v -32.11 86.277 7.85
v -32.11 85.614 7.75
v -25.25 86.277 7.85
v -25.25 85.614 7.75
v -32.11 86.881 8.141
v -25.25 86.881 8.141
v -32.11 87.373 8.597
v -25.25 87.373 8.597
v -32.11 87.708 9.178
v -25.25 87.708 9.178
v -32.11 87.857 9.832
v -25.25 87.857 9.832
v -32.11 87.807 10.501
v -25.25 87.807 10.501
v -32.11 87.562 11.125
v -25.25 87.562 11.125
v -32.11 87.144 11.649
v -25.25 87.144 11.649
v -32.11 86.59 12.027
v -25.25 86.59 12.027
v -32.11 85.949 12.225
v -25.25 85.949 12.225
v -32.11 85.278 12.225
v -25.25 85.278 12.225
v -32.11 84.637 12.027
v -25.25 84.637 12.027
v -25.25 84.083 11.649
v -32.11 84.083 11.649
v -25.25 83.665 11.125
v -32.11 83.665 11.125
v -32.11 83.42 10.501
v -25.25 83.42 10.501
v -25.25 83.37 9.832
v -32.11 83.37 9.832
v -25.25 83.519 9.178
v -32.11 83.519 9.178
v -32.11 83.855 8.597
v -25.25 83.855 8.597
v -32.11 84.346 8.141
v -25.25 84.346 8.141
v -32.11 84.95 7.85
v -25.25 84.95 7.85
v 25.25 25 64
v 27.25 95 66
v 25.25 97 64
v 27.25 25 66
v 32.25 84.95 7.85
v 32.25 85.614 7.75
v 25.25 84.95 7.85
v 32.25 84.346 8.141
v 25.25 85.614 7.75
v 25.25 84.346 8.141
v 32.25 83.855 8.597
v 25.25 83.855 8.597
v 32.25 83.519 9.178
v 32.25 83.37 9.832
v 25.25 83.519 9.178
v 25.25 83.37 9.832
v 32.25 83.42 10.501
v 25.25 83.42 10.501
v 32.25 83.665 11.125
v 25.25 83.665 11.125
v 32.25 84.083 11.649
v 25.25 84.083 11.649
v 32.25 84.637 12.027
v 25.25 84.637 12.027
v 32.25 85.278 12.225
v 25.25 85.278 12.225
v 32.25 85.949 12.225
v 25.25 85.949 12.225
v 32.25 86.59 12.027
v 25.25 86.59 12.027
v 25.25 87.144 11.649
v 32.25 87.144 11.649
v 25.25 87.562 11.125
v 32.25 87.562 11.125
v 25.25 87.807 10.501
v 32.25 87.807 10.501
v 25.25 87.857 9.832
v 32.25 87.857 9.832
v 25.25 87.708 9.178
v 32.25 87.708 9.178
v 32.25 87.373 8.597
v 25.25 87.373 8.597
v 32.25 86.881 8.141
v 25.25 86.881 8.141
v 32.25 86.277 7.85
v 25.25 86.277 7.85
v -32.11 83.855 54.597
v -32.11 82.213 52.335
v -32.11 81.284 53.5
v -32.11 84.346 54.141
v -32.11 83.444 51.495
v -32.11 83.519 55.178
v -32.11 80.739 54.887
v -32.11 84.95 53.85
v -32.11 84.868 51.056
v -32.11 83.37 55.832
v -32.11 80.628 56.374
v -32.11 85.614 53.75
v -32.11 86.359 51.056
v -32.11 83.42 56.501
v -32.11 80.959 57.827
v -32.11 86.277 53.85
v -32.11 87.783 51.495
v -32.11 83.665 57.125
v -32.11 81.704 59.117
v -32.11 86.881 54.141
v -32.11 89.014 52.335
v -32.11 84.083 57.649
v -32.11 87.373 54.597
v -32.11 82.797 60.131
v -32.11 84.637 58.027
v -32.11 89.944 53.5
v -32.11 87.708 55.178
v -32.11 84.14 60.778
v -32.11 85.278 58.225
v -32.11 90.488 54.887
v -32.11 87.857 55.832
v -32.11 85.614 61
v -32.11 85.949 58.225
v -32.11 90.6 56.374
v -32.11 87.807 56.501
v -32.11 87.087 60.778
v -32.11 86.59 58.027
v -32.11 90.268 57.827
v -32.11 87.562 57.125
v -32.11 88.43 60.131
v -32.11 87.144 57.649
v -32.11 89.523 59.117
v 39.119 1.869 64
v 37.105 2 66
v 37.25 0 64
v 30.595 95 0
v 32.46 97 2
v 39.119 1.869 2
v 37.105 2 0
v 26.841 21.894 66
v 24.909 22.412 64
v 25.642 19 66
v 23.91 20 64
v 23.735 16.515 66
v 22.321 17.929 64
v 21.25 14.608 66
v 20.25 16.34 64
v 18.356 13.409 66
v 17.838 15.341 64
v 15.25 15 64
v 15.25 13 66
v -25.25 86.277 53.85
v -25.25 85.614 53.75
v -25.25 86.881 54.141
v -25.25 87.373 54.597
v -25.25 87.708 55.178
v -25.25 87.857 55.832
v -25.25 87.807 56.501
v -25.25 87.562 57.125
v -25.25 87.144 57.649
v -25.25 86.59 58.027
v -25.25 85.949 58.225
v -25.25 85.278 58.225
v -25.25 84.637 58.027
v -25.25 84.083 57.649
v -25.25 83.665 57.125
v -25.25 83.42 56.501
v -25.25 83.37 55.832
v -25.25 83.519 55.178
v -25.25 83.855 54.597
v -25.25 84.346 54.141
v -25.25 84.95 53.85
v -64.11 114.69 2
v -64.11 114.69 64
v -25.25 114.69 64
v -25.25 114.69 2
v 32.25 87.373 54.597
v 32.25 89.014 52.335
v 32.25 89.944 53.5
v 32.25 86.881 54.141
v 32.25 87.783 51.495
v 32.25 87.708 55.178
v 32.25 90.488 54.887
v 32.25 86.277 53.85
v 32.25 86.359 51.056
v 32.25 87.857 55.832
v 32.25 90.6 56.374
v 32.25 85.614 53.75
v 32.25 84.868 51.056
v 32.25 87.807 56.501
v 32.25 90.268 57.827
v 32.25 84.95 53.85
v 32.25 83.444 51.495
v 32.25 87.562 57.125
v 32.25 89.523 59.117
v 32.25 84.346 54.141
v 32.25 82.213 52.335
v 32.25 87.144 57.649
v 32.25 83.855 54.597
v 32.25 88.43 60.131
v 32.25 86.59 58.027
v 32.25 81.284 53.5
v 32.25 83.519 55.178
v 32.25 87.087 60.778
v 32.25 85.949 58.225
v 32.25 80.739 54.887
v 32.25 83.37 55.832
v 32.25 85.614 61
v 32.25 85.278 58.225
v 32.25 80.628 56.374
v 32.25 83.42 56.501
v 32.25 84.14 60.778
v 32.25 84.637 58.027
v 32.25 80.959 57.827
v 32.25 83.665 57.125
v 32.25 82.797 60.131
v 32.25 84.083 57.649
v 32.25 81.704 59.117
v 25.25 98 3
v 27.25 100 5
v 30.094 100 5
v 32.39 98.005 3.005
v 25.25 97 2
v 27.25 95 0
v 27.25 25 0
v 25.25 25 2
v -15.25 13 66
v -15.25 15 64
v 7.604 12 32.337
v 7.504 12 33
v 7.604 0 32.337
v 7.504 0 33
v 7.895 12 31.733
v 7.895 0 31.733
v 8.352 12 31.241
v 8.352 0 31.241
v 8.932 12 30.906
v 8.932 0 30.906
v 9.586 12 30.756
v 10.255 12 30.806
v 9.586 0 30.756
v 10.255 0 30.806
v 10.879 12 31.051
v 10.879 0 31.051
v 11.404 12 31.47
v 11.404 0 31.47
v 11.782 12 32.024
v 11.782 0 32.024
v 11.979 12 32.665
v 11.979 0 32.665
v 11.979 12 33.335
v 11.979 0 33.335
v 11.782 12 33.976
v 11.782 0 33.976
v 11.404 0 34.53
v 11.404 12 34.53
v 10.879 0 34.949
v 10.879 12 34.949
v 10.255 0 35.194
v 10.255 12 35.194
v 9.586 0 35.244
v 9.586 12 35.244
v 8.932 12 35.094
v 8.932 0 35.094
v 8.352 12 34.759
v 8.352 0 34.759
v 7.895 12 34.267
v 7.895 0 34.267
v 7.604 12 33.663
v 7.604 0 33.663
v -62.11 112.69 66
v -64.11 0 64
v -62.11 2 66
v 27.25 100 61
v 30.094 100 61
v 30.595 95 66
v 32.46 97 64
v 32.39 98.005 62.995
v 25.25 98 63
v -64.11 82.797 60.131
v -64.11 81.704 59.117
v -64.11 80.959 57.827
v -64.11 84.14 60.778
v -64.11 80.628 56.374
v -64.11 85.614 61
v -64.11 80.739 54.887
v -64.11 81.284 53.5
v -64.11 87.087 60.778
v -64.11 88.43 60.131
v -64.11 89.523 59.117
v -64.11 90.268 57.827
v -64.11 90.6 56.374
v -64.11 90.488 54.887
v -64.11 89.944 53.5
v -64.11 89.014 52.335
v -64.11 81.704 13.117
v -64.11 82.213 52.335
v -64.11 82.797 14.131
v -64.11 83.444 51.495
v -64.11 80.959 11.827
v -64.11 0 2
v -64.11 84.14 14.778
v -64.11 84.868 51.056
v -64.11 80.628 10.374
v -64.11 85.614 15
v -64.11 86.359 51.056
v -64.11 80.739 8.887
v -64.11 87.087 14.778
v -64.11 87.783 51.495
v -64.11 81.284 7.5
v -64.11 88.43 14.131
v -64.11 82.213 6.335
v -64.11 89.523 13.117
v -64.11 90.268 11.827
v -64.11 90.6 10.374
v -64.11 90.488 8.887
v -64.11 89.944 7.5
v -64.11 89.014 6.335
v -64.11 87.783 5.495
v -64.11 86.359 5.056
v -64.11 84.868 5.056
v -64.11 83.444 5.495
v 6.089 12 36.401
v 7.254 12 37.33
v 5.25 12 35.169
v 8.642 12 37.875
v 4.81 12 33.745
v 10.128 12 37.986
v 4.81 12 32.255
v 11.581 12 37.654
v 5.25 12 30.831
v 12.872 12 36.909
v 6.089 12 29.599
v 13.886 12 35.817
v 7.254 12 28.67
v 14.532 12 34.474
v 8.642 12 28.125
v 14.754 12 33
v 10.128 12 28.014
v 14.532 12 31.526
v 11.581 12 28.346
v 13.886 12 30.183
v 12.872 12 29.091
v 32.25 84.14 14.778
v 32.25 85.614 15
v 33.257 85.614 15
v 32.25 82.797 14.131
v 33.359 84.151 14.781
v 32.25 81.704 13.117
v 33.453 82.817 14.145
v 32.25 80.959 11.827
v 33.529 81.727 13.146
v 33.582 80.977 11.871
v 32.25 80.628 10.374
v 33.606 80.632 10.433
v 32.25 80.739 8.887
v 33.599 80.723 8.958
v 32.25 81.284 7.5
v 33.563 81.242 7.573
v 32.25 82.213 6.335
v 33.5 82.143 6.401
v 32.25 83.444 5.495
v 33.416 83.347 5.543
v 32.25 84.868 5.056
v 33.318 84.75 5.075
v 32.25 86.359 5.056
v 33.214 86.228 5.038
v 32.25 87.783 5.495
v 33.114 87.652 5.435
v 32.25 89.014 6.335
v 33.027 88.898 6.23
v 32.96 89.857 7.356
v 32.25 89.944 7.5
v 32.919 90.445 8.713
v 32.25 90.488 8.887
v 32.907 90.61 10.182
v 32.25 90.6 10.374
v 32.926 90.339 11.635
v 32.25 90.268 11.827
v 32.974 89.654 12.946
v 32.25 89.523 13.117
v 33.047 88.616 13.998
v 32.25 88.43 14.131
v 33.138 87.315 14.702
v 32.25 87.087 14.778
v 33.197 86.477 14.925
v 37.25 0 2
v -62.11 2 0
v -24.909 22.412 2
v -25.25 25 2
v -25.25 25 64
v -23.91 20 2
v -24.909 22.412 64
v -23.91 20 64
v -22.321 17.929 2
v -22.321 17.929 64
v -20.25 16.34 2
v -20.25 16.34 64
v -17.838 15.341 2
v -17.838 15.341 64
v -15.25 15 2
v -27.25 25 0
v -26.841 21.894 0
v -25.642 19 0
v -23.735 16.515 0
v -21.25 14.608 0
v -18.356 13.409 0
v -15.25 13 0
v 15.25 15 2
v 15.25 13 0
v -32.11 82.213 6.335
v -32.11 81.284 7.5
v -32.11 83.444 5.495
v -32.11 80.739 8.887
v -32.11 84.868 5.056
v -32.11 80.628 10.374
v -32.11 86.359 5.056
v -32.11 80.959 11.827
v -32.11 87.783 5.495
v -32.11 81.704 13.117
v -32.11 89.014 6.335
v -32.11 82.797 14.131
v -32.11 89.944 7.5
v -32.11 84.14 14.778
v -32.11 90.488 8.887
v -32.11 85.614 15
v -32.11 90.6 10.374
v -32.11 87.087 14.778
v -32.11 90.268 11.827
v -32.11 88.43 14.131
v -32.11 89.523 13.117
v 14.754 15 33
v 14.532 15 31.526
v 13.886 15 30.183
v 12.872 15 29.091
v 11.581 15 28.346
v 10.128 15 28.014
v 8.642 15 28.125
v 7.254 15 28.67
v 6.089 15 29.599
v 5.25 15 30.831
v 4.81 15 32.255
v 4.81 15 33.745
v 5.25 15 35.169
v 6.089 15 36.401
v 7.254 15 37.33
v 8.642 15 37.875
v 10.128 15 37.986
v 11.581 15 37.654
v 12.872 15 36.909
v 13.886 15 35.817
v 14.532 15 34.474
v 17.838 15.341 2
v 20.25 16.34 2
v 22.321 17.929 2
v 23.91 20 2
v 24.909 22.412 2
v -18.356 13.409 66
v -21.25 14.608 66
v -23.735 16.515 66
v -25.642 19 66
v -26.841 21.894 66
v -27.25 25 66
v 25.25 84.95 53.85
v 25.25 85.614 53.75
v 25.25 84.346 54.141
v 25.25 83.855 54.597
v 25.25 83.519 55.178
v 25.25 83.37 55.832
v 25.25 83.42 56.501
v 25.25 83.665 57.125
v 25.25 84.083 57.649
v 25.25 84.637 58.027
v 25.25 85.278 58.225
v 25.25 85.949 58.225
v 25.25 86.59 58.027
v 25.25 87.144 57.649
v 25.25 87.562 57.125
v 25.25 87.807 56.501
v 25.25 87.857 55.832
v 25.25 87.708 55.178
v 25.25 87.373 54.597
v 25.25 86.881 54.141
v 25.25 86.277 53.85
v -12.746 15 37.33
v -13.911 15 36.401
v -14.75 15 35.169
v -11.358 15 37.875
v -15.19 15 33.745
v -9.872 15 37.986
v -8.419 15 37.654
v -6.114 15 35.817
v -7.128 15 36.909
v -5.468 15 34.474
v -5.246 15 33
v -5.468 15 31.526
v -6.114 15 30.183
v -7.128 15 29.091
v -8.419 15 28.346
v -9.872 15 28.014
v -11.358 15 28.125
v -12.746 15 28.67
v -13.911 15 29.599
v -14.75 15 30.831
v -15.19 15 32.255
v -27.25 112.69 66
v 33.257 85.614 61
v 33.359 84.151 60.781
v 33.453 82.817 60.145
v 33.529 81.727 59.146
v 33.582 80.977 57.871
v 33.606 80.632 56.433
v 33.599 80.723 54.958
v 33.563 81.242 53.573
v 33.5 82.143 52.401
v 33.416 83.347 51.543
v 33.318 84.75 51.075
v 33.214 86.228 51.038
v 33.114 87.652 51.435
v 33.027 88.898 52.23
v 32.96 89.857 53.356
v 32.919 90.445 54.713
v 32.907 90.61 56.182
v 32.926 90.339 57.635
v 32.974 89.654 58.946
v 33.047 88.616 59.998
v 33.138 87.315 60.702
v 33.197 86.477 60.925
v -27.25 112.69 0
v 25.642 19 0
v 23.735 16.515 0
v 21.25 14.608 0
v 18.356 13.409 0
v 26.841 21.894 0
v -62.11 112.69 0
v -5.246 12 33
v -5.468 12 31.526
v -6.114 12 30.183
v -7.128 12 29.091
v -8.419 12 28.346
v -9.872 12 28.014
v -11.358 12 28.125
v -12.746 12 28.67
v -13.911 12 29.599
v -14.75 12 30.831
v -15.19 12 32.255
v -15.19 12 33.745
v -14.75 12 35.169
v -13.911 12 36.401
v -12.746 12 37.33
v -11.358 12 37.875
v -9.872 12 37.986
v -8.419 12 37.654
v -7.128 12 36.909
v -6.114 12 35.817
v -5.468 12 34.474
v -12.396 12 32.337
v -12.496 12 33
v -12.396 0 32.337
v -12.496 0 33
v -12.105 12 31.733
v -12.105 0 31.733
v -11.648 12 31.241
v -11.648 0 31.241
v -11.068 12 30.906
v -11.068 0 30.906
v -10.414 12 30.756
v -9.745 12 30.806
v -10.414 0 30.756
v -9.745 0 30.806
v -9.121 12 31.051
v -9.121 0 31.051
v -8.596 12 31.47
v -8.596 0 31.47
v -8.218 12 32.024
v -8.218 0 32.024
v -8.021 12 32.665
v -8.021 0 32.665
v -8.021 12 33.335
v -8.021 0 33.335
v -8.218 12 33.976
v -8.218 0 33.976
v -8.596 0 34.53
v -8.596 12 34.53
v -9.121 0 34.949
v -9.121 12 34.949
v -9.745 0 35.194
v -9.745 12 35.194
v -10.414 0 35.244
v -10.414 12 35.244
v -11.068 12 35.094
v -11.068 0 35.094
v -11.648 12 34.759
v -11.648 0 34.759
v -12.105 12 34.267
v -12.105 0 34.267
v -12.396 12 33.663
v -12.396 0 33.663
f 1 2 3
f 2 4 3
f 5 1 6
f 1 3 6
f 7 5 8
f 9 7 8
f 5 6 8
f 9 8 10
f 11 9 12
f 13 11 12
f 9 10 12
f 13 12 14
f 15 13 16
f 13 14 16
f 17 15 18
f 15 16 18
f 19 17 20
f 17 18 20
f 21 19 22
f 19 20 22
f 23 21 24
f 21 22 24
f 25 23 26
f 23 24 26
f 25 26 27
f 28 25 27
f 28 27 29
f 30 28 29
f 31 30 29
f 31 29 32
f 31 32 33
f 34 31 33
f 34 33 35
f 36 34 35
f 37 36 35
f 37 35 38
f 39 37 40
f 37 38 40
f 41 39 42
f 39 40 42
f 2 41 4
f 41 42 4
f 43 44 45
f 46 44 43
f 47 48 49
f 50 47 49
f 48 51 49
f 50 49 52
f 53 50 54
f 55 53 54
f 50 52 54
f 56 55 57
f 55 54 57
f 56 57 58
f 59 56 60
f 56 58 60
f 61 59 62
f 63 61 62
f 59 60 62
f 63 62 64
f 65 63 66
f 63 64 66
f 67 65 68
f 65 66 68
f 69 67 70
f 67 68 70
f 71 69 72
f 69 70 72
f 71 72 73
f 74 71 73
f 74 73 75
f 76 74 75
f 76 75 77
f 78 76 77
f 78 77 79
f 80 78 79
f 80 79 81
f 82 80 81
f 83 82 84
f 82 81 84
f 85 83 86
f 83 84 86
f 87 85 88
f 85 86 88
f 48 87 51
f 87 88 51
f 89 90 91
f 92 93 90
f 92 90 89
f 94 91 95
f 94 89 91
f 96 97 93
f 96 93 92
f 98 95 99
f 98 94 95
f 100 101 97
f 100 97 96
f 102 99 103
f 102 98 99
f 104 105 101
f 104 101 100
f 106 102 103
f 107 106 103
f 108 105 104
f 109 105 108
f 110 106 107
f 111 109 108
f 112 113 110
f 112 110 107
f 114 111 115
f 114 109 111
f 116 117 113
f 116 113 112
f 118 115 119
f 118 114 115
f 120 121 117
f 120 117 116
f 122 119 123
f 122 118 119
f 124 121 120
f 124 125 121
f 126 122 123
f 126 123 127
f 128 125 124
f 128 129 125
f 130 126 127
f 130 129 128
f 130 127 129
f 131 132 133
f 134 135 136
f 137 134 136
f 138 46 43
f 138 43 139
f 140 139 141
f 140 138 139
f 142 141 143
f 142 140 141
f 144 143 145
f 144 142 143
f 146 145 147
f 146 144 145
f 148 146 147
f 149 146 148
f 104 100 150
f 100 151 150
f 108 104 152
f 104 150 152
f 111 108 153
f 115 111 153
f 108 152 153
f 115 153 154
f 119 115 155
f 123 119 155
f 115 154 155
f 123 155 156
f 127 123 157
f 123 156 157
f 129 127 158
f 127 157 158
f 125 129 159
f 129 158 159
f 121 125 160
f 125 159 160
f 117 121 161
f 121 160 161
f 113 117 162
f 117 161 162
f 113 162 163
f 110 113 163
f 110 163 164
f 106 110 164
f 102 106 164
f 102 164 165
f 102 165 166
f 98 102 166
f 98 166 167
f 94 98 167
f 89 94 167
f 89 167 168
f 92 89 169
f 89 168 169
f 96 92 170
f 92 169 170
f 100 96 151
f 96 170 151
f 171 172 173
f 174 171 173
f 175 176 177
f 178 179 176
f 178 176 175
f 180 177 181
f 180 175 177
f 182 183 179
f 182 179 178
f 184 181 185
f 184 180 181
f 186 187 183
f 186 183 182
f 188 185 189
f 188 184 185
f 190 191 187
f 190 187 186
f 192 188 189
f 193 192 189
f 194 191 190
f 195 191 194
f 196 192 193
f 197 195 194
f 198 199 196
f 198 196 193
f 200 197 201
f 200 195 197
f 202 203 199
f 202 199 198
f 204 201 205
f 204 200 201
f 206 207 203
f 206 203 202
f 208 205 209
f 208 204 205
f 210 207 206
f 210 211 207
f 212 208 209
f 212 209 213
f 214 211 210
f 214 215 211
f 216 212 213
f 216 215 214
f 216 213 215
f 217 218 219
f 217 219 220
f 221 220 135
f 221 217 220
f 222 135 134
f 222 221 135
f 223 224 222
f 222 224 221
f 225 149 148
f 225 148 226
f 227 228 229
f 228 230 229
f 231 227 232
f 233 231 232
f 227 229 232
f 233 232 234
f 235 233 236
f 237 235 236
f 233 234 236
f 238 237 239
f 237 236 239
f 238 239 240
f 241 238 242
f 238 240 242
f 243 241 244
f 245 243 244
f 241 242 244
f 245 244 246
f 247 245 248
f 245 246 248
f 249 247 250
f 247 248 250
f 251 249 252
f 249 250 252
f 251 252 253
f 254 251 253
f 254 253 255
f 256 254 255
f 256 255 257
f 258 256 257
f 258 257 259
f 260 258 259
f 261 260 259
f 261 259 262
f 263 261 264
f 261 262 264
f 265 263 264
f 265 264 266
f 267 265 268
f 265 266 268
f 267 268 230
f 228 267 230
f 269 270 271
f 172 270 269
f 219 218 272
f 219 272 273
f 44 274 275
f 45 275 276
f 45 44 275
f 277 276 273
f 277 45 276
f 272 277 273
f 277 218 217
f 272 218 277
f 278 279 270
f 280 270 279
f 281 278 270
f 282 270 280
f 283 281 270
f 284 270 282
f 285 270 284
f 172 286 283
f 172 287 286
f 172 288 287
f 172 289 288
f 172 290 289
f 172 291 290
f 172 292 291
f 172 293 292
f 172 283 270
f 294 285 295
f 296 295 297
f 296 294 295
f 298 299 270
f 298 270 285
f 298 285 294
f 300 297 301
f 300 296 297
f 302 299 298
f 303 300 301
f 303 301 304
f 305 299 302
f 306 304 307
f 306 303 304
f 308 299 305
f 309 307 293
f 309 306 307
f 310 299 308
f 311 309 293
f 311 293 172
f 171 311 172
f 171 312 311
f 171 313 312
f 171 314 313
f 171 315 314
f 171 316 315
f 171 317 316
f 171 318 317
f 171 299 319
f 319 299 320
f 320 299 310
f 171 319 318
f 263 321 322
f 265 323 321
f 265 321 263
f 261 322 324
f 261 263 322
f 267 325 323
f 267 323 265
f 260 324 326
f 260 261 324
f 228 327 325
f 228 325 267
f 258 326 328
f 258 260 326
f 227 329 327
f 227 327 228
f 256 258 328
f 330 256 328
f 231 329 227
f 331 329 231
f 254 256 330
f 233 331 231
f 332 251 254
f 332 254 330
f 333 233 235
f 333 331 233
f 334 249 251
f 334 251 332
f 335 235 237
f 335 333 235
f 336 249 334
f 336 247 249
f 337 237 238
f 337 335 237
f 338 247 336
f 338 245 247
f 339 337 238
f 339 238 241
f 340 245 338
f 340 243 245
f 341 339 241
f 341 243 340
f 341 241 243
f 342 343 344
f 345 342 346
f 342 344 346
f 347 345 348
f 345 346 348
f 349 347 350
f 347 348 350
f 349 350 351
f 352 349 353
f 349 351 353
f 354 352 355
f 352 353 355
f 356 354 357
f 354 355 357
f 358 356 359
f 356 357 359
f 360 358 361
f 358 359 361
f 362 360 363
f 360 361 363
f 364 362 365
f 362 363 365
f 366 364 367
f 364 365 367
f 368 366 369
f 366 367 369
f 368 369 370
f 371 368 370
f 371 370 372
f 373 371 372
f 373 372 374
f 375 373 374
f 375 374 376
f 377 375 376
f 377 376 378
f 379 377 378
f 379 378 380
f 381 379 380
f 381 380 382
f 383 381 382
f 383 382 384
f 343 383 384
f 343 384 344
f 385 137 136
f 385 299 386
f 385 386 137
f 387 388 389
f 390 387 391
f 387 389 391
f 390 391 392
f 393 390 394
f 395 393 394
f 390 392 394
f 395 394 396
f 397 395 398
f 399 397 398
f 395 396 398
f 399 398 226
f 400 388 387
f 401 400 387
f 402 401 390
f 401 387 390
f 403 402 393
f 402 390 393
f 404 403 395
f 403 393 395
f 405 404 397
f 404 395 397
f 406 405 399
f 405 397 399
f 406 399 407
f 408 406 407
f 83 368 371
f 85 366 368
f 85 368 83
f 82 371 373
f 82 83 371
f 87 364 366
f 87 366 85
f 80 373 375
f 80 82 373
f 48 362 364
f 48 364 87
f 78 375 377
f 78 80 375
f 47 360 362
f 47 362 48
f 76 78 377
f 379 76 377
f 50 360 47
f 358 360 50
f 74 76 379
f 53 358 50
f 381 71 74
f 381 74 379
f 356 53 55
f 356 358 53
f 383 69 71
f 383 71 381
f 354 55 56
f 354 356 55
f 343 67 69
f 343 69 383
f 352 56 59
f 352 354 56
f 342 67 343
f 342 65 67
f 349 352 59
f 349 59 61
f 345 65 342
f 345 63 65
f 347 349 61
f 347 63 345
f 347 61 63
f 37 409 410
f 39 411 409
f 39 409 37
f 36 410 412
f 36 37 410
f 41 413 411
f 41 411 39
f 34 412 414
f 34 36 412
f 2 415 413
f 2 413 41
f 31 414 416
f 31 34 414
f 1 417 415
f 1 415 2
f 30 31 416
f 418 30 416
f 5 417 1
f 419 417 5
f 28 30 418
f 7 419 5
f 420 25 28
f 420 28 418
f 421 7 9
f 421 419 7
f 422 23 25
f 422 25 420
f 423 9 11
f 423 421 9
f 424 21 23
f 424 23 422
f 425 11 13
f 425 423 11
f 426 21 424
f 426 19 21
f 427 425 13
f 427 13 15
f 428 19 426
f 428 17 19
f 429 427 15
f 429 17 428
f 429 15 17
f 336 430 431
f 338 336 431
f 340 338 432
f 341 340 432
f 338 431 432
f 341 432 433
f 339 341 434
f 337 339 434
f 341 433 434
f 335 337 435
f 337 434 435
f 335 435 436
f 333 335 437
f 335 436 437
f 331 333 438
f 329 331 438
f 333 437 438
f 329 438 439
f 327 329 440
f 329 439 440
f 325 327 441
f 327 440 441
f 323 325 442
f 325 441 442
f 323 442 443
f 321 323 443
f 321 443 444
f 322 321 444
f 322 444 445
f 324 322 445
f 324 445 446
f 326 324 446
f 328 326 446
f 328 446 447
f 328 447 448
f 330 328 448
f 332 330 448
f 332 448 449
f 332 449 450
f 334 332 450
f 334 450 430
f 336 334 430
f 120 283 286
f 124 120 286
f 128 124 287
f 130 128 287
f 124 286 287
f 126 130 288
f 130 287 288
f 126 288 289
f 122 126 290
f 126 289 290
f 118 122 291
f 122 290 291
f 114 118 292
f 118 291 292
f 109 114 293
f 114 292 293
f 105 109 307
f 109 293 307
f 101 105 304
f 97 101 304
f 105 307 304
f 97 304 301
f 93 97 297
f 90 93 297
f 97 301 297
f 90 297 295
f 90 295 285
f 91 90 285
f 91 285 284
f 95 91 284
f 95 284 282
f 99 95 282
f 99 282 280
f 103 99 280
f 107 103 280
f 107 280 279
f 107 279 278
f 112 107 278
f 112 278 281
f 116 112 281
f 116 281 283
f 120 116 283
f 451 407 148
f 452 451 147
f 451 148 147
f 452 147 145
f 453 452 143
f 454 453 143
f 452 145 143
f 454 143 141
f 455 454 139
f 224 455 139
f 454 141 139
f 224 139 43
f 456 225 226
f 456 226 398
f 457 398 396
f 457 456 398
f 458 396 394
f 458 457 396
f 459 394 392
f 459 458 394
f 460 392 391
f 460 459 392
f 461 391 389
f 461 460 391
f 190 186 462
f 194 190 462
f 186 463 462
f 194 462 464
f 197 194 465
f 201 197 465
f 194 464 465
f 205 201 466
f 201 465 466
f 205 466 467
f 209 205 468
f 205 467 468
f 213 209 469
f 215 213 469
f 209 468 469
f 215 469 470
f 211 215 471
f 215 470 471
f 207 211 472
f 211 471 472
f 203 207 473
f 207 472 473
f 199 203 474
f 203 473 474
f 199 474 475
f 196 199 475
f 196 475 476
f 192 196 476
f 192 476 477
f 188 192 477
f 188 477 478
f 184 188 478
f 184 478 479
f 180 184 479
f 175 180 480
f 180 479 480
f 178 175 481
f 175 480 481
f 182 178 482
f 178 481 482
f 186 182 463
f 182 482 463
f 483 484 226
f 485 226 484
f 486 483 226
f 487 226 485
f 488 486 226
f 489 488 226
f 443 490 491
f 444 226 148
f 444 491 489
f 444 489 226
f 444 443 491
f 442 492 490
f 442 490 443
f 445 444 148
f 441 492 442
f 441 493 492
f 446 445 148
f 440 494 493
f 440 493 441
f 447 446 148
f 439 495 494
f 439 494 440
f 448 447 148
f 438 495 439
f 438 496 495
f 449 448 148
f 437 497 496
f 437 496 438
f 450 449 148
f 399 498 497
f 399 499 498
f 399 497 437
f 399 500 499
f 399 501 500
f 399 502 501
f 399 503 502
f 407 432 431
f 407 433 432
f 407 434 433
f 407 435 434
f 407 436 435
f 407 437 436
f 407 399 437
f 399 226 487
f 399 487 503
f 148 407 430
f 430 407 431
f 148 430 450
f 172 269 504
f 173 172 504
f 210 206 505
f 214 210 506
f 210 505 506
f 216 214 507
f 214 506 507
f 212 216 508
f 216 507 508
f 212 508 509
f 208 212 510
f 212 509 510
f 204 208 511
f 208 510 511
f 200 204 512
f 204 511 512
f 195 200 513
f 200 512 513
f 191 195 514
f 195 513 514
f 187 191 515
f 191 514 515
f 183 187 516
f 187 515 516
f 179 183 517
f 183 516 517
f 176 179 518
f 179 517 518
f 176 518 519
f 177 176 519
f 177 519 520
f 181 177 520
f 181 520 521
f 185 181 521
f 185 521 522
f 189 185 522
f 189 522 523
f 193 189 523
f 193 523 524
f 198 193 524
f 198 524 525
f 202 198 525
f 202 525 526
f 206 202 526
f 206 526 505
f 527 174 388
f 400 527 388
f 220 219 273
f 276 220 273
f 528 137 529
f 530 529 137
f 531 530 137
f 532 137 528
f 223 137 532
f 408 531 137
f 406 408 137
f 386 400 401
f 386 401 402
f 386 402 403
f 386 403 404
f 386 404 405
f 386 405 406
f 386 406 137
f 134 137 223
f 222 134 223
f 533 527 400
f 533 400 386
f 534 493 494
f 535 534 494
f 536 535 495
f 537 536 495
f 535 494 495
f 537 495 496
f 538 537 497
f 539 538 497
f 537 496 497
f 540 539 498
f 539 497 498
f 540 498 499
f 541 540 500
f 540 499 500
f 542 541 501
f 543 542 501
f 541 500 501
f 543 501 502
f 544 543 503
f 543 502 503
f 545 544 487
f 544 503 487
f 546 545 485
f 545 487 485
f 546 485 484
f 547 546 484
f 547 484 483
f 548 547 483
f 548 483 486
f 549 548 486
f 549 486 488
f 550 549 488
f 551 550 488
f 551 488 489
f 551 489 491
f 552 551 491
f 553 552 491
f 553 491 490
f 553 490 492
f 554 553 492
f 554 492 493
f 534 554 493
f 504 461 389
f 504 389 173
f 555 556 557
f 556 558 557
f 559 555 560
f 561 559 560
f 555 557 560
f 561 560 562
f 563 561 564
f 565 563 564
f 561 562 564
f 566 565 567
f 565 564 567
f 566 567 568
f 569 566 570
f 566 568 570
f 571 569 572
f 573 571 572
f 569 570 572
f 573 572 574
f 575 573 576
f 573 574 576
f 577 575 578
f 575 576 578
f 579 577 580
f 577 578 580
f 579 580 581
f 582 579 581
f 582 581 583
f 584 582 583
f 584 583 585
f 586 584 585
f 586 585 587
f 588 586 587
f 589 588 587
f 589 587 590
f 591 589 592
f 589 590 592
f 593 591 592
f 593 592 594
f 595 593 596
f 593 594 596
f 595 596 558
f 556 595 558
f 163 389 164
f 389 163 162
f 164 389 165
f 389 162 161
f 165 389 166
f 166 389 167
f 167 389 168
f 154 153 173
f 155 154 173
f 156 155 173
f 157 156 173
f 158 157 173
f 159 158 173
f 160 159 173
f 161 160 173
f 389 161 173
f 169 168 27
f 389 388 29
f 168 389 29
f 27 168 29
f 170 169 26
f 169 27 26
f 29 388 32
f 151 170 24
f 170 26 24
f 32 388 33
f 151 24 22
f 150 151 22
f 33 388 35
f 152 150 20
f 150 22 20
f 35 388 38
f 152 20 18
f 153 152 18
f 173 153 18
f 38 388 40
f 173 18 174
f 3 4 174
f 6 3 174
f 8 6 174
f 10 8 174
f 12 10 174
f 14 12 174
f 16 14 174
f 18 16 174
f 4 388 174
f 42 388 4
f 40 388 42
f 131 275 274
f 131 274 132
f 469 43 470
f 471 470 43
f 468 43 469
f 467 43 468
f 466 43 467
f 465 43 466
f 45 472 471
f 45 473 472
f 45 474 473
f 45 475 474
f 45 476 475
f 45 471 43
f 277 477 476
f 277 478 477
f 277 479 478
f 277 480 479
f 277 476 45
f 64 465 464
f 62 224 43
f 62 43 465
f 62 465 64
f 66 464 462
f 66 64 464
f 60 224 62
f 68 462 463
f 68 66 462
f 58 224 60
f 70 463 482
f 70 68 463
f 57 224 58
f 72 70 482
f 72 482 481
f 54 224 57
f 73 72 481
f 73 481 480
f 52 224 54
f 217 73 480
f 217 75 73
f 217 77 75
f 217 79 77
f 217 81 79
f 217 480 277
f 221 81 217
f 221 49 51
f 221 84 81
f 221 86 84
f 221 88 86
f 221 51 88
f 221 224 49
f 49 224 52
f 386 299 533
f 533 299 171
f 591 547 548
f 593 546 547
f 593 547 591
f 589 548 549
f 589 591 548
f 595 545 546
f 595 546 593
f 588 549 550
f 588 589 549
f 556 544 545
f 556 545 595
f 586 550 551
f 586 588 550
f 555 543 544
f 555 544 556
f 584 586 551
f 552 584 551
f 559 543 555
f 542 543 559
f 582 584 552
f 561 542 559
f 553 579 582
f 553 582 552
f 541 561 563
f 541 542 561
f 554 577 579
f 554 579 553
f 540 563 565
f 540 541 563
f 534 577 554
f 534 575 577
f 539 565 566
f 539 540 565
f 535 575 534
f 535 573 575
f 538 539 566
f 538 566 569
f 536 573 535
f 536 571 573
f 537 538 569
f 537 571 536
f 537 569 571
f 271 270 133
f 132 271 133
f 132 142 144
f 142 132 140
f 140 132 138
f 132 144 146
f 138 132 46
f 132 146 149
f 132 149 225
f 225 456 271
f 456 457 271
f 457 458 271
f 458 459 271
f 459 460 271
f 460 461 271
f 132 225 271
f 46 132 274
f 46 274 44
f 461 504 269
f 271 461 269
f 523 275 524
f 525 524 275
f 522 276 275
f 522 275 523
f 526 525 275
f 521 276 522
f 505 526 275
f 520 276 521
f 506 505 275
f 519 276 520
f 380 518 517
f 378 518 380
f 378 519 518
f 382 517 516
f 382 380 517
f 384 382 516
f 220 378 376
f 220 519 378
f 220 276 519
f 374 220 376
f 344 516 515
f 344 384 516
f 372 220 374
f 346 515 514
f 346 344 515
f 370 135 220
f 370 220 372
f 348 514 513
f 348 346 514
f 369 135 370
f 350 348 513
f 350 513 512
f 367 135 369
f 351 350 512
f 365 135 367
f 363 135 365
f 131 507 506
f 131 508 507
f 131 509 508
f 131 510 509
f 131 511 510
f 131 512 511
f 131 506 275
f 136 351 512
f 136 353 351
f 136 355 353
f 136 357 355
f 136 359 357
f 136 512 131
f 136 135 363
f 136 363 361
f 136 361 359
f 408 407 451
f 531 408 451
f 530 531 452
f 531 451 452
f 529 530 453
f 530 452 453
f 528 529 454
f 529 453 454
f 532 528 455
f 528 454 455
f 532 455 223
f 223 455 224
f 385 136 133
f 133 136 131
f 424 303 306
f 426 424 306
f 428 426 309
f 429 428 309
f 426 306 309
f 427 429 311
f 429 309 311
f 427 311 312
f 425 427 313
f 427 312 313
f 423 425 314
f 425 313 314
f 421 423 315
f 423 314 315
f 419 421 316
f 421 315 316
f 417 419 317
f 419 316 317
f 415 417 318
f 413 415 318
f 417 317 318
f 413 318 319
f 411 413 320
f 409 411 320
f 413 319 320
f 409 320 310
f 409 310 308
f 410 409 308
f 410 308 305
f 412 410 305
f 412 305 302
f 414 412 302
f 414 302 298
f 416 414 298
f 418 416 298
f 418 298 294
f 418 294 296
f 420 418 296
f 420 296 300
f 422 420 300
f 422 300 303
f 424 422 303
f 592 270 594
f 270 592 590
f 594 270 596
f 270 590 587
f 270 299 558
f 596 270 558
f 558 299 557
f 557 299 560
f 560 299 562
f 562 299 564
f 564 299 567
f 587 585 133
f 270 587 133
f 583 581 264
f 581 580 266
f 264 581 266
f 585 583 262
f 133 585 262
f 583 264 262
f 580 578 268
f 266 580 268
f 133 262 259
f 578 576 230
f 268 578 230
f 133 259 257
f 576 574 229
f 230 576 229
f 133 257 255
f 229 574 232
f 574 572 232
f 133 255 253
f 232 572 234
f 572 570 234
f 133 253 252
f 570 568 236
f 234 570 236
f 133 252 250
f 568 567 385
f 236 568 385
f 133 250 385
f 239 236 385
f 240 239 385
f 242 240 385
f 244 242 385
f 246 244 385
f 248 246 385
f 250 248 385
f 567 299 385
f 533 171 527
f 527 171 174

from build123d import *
from OCP.BRepFilletAPI import BRepFilletAPI_MakeChamfer

# Parameters (mm, degrees)
ESTRUSIONE_ESTRUSIONE1_DEPTH                         = 66
RACCORDO1_R                                          = 10
SMUSSO1_SIZE                                         = 2
SMUSSO1_SIZE2                                        = 2.155800013
SMUSSO1_SIZE2_2                                      = 1.873732722
SMUSSO2_SIZE                                         = 5
FORO_LAMATO_PER_VITE_M4_A_TESTA_CILINDRI_D           = 4.5
FORO_LAMATO_PER_VITE_M4_A_TESTA_CILINDRI_DEPTH       = 30
FORO_LAMATO_PER_VITE_M4_A_TESTA_CILINDRI_CBORE_D     = 10
FORO_LAMATO_PER_VITE_M4_A_TESTA_CILINDRI_CBORE_DEPTH = 3
FORO_LAMATO_PER_VITE_M4_A_TESTA_CILINDRI_TIP         = 1.351936393
FORO_LAMATO_PER_VITE_M4_A_TESTA_CILI_2_D             = 4.5
FORO_LAMATO_PER_VITE_M4_A_TESTA_CILI_2_DEPTH         = 30
FORO_LAMATO_PER_VITE_M4_A_TESTA_CILI_2_CBORE_D       = 10
FORO_LAMATO_PER_VITE_M4_A_TESTA_CILI_2_CBORE_DEPTH   = 3
FORO_LAMATO_PER_VITE_M4_A_TESTA_CILI_2_TIP           = 1.351936393
FORO_LAMATO_PER_VITE_M4_A_TESTA_CILI_3_D             = 4.5
FORO_LAMATO_PER_VITE_M4_A_TESTA_CILI_3_DEPTH         = 45
FORO_LAMATO_PER_VITE_M4_A_TESTA_CILI_3_CBORE_D       = 10
FORO_LAMATO_PER_VITE_M4_A_TESTA_CILI_3_CBORE_DEPTH   = 32
FORO_LAMATO_PER_VITE_M4_A_TESTA_CILI_3_TIP           = 1.351936393


with BuildPart() as part:
    # Schizzo1 → Estrusione-Estrusione1 (new body)
    with BuildSketch(Plane.XY):
        Polygon((25.25, 100), (32.25, 100), (39.25, 0), (-39.25, 0), (-64.110342, 0), (-64.110342, 114.69), (-25.25, 114.69), (-25.25, 100), (-25.25, 15), (25.25, 15), align=None)
    extrude(amount=ESTRUSIONE_ESTRUSIONE1_DEPTH)

    # Raccordo1
    raccordo1_edges = [part.edges().sort_by_distance(p)[0] for p in [
        (-25.25, 15, 33),
        (25.25, 15, 33),
    ]]
    fillet(raccordo1_edges, radius=RACCORDO1_R)

    # Smusso1: one chamfer whose edges measure the first distance from different faces: ONE call of the kernel's chamfer builder (chamfer() names one face for all edges)
    smusso1_edges_1 = [part.edges().sort_by_distance(p)[0] for p in [
        (35.75, 50, 0),
        (-12.430171, 0, 0),
        (-64.110342, 57.345, 0),
        (-44.680171, 114.69, 0),
        (25.25, 62.5, 0),
        (25.25, 100, 33),
        (-44.680171, 114.69, 66),
        (-64.110342, 57.345, 66),
        (-12.430171, 0, 66),
        (-25.25, 69.845, 0),
        (-25.25, 69.845, 66),
        (0, 15, 0),
        (0, 15, 66),
        (-22.321067812, 17.928932188, 0),
        (-22.321067812, 17.928932188, 66),
        (35.75, 50, 66),
        (22.321067812, 17.928932188, 0),
        (22.321067812, 17.928932188, 66),
        (25.25, 62.5, 66),
    ]]
    smusso1_edges_2 = [part.edges().sort_by_distance(p)[0] for p in [
        (32.25, 100, 33),
    ]]
    smusso1_side_2 = [part.faces().sort_by_distance(p)[0] for p in [
        (35.75, 50, 33),
    ]]
    smusso1_edges_3 = [part.edges().sort_by_distance(p)[0] for p in [
        (39.25, 0, 33),
    ]]
    smusso1_side_3 = [part.faces().sort_by_distance(p)[0] for p in [
        (-12.430171, 0, 33),
    ]]
    smusso1 = BRepFilletAPI_MakeChamfer(part.part.solid().wrapped)
    for e in smusso1_edges_1:
        smusso1.Add(SMUSSO1_SIZE, e.wrapped)
    for e in smusso1_edges_2:
        smusso1.Add(SMUSSO1_SIZE, SMUSSO1_SIZE2, e.wrapped, smusso1_side_2[0].wrapped)  # the first distance lies on this face
    for e in smusso1_edges_3:
        smusso1.Add(SMUSSO1_SIZE, SMUSSO1_SIZE2_2, e.wrapped, smusso1_side_3[0].wrapped)  # the first distance lies on this face
    add(Compound.cast(smusso1.Shape()), mode=Mode.REPLACE)

    # Smusso2
    # the kernel refuses this chamfer: 5 mm, written as the material it takes off along each edge
    with BuildSketch(Plane(origin=(14.39158506, 100, 66), x_dir=(2.02935454733688e-15, -0.9996219169112968, 0.027495876610587663), z_dir=(1, 0, 0)), Plane(origin=(14.39158506, 100, 0), x_dir=(0, 0.0274958766105877, 0.9996219169112968), z_dir=(1, 0, 0))) as smusso2_piece_1:
        Polygon((SMUSSO2_SIZE * 0.999621916911, SMUSSO2_SIZE * 0.0274958766106), (-SMUSSO2_SIZE * 0.0274958766106, SMUSSO2_SIZE * 0.999621916911), (0, 0), align=None)
    extrude(amount=28.561029867, mode=Mode.SUBTRACT)

    # Foro lamato per Vite M4 a testa cilindri
    with Locations(Plane(origin=(35.25, 0, 0), x_dir=(0, 0, 1), z_dir=(1, 0, 0))):
        with Locations((56, -85.613628), (10, -85.613628)):
            CounterBoreHole(FORO_LAMATO_PER_VITE_M4_A_TESTA_CILINDRI_D / 2, FORO_LAMATO_PER_VITE_M4_A_TESTA_CILINDRI_CBORE_D / 2, FORO_LAMATO_PER_VITE_M4_A_TESTA_CILINDRI_CBORE_DEPTH, depth=FORO_LAMATO_PER_VITE_M4_A_TESTA_CILINDRI_DEPTH)
            with Locations((0, 0, -(FORO_LAMATO_PER_VITE_M4_A_TESTA_CILINDRI_DEPTH + FORO_LAMATO_PER_VITE_M4_A_TESTA_CILINDRI_TIP / 2))):  # 118° drill point
                Cone(0, FORO_LAMATO_PER_VITE_M4_A_TESTA_CILINDRI_D / 2, FORO_LAMATO_PER_VITE_M4_A_TESTA_CILINDRI_TIP, mode=Mode.SUBTRACT)

    # Foro lamato per Vite M4 a testa cili 2
    with Locations(Plane(origin=(0, 15, 0), x_dir=(1, 0, 0), z_dir=(0, 1, 0))):
        with Locations((-10.245584981, -33), (9.754415019, -33)):
            CounterBoreHole(FORO_LAMATO_PER_VITE_M4_A_TESTA_CILI_2_D / 2, FORO_LAMATO_PER_VITE_M4_A_TESTA_CILI_2_CBORE_D / 2, FORO_LAMATO_PER_VITE_M4_A_TESTA_CILI_2_CBORE_DEPTH, depth=FORO_LAMATO_PER_VITE_M4_A_TESTA_CILI_2_DEPTH)
            with Locations((0, 0, -(FORO_LAMATO_PER_VITE_M4_A_TESTA_CILI_2_DEPTH + FORO_LAMATO_PER_VITE_M4_A_TESTA_CILI_2_TIP / 2))):  # 118° drill point
                Cone(0, FORO_LAMATO_PER_VITE_M4_A_TESTA_CILI_2_D / 2, FORO_LAMATO_PER_VITE_M4_A_TESTA_CILI_2_TIP, mode=Mode.SUBTRACT)

    # Foro lamato per Vite M4 a testa cili 3
    with Locations(Plane.ZY.offset(64.110342)):
        with Locations((10, 85.613628), (56, 85.613628)):
            CounterBoreHole(FORO_LAMATO_PER_VITE_M4_A_TESTA_CILI_3_D / 2, FORO_LAMATO_PER_VITE_M4_A_TESTA_CILI_3_CBORE_D / 2, FORO_LAMATO_PER_VITE_M4_A_TESTA_CILI_3_CBORE_DEPTH, depth=FORO_LAMATO_PER_VITE_M4_A_TESTA_CILI_3_DEPTH)
            with Locations((0, 0, -(FORO_LAMATO_PER_VITE_M4_A_TESTA_CILI_3_DEPTH + FORO_LAMATO_PER_VITE_M4_A_TESTA_CILI_3_TIP / 2))):  # 118° drill point
                Cone(0, FORO_LAMATO_PER_VITE_M4_A_TESTA_CILI_3_D / 2, FORO_LAMATO_PER_VITE_M4_A_TESTA_CILI_3_TIP, mode=Mode.SUBTRACT)


solid = part.part
